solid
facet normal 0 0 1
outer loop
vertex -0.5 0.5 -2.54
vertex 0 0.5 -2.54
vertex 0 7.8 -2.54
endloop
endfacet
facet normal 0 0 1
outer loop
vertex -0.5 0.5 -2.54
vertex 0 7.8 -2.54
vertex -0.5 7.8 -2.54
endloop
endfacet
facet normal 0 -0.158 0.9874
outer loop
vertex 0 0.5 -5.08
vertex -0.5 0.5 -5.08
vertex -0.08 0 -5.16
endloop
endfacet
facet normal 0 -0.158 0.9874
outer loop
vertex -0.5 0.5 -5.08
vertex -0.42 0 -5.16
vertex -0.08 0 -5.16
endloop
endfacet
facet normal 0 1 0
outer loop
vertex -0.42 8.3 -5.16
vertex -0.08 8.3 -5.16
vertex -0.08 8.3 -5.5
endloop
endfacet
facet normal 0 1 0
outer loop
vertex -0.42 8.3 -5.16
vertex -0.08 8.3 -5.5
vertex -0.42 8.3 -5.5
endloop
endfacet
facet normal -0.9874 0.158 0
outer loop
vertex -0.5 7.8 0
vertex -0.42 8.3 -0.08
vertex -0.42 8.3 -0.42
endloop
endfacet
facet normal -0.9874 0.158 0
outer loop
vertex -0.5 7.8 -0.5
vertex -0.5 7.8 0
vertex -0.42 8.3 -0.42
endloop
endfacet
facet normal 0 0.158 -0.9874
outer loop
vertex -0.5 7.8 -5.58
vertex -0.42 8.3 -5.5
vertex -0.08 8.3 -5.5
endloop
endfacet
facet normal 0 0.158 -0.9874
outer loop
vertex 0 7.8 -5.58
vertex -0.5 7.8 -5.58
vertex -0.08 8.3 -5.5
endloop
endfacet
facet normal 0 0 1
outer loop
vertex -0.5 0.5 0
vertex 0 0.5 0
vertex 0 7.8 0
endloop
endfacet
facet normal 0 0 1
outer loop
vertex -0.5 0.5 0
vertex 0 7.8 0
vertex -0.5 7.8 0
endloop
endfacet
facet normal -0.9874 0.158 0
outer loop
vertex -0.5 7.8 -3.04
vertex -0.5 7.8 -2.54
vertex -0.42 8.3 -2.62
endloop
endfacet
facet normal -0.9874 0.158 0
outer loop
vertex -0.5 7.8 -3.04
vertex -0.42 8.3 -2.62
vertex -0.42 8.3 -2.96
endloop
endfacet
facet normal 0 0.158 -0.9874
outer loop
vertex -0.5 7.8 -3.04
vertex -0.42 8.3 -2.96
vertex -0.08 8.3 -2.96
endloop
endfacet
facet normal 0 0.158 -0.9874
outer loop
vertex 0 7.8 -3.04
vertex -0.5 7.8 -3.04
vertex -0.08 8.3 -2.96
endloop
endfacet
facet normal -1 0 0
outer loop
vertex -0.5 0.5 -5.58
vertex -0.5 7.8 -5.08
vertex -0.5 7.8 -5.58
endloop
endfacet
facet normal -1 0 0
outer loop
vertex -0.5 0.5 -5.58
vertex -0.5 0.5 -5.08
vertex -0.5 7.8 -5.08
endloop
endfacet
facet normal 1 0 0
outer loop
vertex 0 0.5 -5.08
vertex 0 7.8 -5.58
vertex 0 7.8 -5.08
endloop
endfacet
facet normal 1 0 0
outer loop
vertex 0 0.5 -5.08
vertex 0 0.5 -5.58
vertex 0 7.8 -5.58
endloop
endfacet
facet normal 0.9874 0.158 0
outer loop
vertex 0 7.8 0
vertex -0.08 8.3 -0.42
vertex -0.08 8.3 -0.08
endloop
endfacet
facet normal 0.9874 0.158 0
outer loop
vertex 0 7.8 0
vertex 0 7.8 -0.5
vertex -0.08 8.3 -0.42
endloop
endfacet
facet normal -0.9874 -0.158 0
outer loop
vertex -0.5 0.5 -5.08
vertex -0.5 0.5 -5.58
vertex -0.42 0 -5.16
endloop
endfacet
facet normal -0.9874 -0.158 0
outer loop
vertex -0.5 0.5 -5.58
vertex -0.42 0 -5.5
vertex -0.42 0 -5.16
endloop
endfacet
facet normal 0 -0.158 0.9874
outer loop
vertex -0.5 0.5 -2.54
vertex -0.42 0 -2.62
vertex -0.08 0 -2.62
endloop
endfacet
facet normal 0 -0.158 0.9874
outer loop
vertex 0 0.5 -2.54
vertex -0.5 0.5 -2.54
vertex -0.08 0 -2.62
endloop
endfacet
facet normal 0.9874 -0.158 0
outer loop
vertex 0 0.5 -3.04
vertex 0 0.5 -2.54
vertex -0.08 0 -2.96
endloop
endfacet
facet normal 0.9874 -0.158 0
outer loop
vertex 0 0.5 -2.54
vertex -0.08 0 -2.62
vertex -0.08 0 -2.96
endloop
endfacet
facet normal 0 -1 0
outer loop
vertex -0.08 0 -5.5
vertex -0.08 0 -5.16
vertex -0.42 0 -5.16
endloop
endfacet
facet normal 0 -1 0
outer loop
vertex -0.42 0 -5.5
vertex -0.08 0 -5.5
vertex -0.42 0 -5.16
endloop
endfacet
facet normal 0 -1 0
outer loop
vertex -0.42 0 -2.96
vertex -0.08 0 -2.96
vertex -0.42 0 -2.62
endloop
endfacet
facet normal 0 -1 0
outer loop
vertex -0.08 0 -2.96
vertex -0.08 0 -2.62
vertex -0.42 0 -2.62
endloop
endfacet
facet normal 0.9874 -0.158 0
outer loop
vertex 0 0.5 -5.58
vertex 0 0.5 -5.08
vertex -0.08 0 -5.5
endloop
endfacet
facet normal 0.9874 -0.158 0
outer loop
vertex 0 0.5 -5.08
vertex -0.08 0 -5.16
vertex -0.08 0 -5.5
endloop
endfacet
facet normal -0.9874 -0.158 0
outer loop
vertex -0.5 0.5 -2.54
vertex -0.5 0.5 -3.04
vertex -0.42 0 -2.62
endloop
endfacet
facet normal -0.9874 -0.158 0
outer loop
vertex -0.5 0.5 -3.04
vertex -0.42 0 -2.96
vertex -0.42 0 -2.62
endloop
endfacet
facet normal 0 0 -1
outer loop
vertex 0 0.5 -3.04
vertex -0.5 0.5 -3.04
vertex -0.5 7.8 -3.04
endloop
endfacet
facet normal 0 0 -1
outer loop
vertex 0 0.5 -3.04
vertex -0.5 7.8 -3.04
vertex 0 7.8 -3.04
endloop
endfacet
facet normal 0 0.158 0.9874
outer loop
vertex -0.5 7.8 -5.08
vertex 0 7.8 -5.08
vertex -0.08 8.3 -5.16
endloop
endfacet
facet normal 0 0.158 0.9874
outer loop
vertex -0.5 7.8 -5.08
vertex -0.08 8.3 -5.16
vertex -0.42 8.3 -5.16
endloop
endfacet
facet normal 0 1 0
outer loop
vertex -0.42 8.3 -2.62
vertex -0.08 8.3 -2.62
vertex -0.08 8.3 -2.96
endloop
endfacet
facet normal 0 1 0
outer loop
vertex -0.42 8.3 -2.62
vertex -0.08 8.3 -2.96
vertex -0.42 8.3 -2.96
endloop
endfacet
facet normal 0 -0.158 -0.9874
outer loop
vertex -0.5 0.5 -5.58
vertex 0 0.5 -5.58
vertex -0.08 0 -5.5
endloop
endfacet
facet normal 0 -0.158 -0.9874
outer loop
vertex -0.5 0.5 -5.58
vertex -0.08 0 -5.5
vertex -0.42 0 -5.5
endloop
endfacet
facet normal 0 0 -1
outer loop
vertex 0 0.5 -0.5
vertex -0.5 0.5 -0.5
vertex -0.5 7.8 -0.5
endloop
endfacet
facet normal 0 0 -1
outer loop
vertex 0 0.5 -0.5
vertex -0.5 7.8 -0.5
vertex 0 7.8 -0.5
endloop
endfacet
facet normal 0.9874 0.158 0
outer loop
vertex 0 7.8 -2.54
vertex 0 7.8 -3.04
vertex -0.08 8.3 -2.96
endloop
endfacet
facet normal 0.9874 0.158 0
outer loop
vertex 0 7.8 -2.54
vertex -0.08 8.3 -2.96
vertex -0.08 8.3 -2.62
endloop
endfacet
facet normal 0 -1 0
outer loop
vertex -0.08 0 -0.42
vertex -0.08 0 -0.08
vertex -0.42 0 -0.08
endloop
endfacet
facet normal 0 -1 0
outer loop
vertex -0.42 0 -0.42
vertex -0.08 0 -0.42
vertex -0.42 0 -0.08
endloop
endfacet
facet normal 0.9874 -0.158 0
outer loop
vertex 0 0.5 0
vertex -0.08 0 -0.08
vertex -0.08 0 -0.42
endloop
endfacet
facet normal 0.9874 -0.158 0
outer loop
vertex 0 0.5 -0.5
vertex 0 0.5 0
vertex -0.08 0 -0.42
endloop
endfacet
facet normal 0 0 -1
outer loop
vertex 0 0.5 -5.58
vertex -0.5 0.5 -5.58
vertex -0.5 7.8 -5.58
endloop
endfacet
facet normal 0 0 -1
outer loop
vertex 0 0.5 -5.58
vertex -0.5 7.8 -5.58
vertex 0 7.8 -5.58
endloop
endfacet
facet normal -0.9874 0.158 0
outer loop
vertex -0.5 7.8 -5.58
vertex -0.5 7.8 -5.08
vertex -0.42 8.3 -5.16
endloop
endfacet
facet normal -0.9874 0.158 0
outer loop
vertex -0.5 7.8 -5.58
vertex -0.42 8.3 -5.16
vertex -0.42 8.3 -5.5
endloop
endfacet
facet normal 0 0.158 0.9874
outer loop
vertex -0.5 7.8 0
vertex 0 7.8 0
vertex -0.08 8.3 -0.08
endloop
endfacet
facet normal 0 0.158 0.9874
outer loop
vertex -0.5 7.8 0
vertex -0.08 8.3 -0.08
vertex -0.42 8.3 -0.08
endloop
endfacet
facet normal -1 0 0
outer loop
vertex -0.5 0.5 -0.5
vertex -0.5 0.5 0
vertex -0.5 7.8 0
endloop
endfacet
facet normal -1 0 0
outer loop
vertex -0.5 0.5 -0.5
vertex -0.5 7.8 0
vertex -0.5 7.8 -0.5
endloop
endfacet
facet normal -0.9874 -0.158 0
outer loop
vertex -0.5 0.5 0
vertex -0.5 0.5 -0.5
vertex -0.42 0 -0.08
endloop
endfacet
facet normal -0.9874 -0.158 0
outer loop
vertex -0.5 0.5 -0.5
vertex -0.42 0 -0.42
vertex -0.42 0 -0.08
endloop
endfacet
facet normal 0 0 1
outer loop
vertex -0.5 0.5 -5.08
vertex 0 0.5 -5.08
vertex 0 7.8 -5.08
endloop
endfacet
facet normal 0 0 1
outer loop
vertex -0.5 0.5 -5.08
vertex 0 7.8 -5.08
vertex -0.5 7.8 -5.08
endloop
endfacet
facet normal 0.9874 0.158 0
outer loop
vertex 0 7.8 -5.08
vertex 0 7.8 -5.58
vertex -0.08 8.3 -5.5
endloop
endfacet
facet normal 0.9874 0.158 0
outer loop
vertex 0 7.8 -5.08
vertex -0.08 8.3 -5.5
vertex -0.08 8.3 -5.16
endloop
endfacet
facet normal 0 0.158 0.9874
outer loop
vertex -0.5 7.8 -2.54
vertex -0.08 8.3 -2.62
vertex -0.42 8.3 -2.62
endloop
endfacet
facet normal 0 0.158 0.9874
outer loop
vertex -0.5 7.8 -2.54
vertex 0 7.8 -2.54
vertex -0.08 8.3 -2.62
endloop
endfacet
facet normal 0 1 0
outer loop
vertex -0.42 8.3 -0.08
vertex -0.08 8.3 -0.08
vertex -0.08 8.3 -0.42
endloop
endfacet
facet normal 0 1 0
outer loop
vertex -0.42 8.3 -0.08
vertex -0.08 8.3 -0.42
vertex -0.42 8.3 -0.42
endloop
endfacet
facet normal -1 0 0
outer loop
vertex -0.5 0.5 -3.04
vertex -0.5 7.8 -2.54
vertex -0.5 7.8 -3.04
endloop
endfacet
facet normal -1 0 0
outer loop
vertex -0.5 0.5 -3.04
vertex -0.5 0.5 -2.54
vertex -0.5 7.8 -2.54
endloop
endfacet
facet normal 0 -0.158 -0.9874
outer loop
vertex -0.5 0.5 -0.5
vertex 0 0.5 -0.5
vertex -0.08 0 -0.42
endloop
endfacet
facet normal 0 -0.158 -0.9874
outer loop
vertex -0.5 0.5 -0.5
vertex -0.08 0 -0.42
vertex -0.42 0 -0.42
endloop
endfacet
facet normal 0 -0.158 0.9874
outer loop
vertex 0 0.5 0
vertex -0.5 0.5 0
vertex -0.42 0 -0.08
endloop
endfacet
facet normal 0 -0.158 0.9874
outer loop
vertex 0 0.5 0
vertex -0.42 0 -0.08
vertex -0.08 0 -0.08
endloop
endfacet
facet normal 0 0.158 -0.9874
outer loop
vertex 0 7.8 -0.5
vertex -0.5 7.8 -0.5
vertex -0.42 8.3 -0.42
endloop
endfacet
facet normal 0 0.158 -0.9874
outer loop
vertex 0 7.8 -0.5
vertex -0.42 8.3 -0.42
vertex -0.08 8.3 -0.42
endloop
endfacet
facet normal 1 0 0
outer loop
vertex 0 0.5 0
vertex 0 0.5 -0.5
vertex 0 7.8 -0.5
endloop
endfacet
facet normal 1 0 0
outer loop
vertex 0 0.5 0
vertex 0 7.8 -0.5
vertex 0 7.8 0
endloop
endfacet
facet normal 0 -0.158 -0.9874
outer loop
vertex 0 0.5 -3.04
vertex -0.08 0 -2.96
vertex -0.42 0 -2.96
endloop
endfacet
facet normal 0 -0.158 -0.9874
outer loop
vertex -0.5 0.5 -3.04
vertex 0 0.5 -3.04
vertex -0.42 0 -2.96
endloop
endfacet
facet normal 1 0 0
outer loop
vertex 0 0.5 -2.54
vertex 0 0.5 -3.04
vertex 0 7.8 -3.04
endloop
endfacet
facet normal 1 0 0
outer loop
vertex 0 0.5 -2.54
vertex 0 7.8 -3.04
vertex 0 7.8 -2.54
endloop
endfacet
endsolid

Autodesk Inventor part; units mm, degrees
ref_plane "YZ Plane" through (0, 0, 0) normal (1, 0, 0) x (0, 1, 0)
ref_plane "XZ Plane" through (0, 0, 0) normal (0, 1, 0) x (-1, 0, 0)
ref_plane "XY Plane" through (0, 0, 0) normal (0, 0, 1) x (1, 0, 0)
sketch "Boceto1" plane through (0, 0, 0) normal (0, 1, 0) x (-1, 0, 0)
  line L0 (0, 0) -> (0.5, 0)
  line L1 (0.5, 0) -> (0.5, -0.5)
  line L2 (0.5, -0.5) -> (0, -0.5)
  line L3 (0, -0.5) -> (0, 0)
  line L4 (0, -2.54) -> (0.5, -2.54)
  line L5 (0.5, -2.54) -> (0.5, -3.04)
  line L6 (0.5, -3.04) -> (0, -3.04)
  line L7 (0, -3.04) -> (0, -2.54)
  line L8 (0, -5.08) -> (0.5, -5.08)
  line L9 (0.5, -5.08) -> (0.5, -5.58)
  line L10 (0.5, -5.58) -> (0, -5.58)
  line L11 (0, -5.58) -> (0, -5.08)
  dimension "d0" = 0.5
  dimension "d1" = 0.5
  dimension "d2" = 0.5
  dimension "d3" = 0.5
  dimension "d7" = 2.04
  dimension "d8" = 0.5
  dimension "d9" = 0.5
  dimension "d10" = 2.04
extrude "Extrusión1" add sketch "Boceto1" along normal blind 8.3
chamfer "Chaflán1" distance 0.08 distance2 0.5 1 edges at (-0.25, 8.3, 0) measured on face at (-0.1667, 8.3, -0.1667)
chamfer "Chaflán2" distance 0.08 distance2 0.5 1 edges at (0, 8.3, -0.29) measured on face at (-0.1667, 8.3, -0.22)
chamfer "Chaflán3" distance 0.08 distance2 0.5 1 edges at (-0.29, 8.3, -0.5) measured on face at (-0.22, 8.3, -0.22)
chamfer "Chaflán4" distance 0.08 distance2 0.5 1 edges at (-0.5, 8.3, -0.25) measured on face at (-0.22, 8.3, -0.1933)
chamfer "Chaflán5" distance 0.08 distance2 0.5 1 edges at (-0.5, 8.3, -2.79) measured on face at (-0.1667, 8.3, -2.7067)
chamfer "Chaflán6" distance 0.08 distance2 0.5 1 edges at (-0.21, 8.3, -2.54) measured on face at (-0.14, 8.3, -2.7067)
chamfer "Chaflán7" distance 0.08 distance2 0.5 1 edges at (-0.21, 8.3, -3.04) measured on face at (-0.14, 8.3, -2.76)
chamfer "Chaflán8" distance 0.08 distance2 0.5 1 edges at (0, 8.3, -2.79) measured on face at (-0.14, 8.3, -2.7333)
chamfer "Chaflán9" distance 0.08 distance2 0.5 1 edges at (-0.5, 8.3, -5.33) measured on face at (-0.1667, 8.3, -5.2467)
chamfer "Chaflán10" distance 0.08 distance2 0.5 1 edges at (-0.21, 8.3, -5.08) measured on face at (-0.14, 8.3, -5.2467)
chamfer "Chaflán11" distance 0.08 distance2 0.5 1 edges at (-0.21, 8.3, -5.58) measured on face at (-0.14, 8.3, -5.3)
chamfer "Chaflán12" distance 0.08 distance2 0.5 1 edges at (0, 8.3, -5.33) measured on face at (-0.14, 8.3, -5.2733)
chamfer "Chaflán13" distance 0.5 distance2 0.08 1 edges at (-0.5, 0, -0.25) measured on face at (-0.5, 2.6, -0.3333)
chamfer "Chaflán14" distance 0.5 distance2 0.08 1 edges at (-0.21, 0, -0.5) measured on face at (-0.1667, 2.7667, -0.5)
chamfer "Chaflán15" distance 0.5 distance2 0.08 1 edges at (0, 0, -0.21) measured on face at (0, 2.7667, -0.1667)
chamfer "Chaflán16" distance 0.5 distance2 0.08 1 edges at (-0.25, 0, 0) measured on face at (-0.3333, 2.9333, 0)
chamfer "Chaflán17" distance 0.5 distance2 0.08 1 edges at (-0.5, 0, -2.79) measured on face at (-0.5, 5.2, -2.7067)
chamfer "Chaflán18" distance 0.5 distance2 0.08 1 edges at (-0.21, 0, -2.54) measured on face at (-0.1667, 2.7667, -2.54)
chamfer "Chaflán19" distance 0.5 distance2 0.08 1 edges at (-0.21, 0, -3.04) measured on face at (-0.1667, 2.7667, -3.04)
chamfer "Chaflán20" distance 0.5 distance2 0.08 1 edges at (0, 0, -2.79) measured on face at (0, 2.9333, -2.7067)
chamfer "Chaflán21" distance 0.5 distance2 0.08 1 edges at (-0.5, 0, -5.33) measured on face at (-0.5, 5.2, -5.2467)
chamfer "Chaflán22" distance 0.5 distance2 0.08 1 edges at (-0.21, 0, -5.08) measured on face at (-0.1667, 2.7667, -5.08)
chamfer "Chaflán23" distance 0.5 distance2 0.08 1 edges at (0, 0, -5.37) measured on face at (0, 2.7667, -5.4133)
chamfer "Chaflán24" distance 0.5 distance2 0.08 1 edges at (-0.25, 0, -5.58) measured on face at (-0.1667, 2.9333, -5.58)
properties part number "Conector 3 pines"
